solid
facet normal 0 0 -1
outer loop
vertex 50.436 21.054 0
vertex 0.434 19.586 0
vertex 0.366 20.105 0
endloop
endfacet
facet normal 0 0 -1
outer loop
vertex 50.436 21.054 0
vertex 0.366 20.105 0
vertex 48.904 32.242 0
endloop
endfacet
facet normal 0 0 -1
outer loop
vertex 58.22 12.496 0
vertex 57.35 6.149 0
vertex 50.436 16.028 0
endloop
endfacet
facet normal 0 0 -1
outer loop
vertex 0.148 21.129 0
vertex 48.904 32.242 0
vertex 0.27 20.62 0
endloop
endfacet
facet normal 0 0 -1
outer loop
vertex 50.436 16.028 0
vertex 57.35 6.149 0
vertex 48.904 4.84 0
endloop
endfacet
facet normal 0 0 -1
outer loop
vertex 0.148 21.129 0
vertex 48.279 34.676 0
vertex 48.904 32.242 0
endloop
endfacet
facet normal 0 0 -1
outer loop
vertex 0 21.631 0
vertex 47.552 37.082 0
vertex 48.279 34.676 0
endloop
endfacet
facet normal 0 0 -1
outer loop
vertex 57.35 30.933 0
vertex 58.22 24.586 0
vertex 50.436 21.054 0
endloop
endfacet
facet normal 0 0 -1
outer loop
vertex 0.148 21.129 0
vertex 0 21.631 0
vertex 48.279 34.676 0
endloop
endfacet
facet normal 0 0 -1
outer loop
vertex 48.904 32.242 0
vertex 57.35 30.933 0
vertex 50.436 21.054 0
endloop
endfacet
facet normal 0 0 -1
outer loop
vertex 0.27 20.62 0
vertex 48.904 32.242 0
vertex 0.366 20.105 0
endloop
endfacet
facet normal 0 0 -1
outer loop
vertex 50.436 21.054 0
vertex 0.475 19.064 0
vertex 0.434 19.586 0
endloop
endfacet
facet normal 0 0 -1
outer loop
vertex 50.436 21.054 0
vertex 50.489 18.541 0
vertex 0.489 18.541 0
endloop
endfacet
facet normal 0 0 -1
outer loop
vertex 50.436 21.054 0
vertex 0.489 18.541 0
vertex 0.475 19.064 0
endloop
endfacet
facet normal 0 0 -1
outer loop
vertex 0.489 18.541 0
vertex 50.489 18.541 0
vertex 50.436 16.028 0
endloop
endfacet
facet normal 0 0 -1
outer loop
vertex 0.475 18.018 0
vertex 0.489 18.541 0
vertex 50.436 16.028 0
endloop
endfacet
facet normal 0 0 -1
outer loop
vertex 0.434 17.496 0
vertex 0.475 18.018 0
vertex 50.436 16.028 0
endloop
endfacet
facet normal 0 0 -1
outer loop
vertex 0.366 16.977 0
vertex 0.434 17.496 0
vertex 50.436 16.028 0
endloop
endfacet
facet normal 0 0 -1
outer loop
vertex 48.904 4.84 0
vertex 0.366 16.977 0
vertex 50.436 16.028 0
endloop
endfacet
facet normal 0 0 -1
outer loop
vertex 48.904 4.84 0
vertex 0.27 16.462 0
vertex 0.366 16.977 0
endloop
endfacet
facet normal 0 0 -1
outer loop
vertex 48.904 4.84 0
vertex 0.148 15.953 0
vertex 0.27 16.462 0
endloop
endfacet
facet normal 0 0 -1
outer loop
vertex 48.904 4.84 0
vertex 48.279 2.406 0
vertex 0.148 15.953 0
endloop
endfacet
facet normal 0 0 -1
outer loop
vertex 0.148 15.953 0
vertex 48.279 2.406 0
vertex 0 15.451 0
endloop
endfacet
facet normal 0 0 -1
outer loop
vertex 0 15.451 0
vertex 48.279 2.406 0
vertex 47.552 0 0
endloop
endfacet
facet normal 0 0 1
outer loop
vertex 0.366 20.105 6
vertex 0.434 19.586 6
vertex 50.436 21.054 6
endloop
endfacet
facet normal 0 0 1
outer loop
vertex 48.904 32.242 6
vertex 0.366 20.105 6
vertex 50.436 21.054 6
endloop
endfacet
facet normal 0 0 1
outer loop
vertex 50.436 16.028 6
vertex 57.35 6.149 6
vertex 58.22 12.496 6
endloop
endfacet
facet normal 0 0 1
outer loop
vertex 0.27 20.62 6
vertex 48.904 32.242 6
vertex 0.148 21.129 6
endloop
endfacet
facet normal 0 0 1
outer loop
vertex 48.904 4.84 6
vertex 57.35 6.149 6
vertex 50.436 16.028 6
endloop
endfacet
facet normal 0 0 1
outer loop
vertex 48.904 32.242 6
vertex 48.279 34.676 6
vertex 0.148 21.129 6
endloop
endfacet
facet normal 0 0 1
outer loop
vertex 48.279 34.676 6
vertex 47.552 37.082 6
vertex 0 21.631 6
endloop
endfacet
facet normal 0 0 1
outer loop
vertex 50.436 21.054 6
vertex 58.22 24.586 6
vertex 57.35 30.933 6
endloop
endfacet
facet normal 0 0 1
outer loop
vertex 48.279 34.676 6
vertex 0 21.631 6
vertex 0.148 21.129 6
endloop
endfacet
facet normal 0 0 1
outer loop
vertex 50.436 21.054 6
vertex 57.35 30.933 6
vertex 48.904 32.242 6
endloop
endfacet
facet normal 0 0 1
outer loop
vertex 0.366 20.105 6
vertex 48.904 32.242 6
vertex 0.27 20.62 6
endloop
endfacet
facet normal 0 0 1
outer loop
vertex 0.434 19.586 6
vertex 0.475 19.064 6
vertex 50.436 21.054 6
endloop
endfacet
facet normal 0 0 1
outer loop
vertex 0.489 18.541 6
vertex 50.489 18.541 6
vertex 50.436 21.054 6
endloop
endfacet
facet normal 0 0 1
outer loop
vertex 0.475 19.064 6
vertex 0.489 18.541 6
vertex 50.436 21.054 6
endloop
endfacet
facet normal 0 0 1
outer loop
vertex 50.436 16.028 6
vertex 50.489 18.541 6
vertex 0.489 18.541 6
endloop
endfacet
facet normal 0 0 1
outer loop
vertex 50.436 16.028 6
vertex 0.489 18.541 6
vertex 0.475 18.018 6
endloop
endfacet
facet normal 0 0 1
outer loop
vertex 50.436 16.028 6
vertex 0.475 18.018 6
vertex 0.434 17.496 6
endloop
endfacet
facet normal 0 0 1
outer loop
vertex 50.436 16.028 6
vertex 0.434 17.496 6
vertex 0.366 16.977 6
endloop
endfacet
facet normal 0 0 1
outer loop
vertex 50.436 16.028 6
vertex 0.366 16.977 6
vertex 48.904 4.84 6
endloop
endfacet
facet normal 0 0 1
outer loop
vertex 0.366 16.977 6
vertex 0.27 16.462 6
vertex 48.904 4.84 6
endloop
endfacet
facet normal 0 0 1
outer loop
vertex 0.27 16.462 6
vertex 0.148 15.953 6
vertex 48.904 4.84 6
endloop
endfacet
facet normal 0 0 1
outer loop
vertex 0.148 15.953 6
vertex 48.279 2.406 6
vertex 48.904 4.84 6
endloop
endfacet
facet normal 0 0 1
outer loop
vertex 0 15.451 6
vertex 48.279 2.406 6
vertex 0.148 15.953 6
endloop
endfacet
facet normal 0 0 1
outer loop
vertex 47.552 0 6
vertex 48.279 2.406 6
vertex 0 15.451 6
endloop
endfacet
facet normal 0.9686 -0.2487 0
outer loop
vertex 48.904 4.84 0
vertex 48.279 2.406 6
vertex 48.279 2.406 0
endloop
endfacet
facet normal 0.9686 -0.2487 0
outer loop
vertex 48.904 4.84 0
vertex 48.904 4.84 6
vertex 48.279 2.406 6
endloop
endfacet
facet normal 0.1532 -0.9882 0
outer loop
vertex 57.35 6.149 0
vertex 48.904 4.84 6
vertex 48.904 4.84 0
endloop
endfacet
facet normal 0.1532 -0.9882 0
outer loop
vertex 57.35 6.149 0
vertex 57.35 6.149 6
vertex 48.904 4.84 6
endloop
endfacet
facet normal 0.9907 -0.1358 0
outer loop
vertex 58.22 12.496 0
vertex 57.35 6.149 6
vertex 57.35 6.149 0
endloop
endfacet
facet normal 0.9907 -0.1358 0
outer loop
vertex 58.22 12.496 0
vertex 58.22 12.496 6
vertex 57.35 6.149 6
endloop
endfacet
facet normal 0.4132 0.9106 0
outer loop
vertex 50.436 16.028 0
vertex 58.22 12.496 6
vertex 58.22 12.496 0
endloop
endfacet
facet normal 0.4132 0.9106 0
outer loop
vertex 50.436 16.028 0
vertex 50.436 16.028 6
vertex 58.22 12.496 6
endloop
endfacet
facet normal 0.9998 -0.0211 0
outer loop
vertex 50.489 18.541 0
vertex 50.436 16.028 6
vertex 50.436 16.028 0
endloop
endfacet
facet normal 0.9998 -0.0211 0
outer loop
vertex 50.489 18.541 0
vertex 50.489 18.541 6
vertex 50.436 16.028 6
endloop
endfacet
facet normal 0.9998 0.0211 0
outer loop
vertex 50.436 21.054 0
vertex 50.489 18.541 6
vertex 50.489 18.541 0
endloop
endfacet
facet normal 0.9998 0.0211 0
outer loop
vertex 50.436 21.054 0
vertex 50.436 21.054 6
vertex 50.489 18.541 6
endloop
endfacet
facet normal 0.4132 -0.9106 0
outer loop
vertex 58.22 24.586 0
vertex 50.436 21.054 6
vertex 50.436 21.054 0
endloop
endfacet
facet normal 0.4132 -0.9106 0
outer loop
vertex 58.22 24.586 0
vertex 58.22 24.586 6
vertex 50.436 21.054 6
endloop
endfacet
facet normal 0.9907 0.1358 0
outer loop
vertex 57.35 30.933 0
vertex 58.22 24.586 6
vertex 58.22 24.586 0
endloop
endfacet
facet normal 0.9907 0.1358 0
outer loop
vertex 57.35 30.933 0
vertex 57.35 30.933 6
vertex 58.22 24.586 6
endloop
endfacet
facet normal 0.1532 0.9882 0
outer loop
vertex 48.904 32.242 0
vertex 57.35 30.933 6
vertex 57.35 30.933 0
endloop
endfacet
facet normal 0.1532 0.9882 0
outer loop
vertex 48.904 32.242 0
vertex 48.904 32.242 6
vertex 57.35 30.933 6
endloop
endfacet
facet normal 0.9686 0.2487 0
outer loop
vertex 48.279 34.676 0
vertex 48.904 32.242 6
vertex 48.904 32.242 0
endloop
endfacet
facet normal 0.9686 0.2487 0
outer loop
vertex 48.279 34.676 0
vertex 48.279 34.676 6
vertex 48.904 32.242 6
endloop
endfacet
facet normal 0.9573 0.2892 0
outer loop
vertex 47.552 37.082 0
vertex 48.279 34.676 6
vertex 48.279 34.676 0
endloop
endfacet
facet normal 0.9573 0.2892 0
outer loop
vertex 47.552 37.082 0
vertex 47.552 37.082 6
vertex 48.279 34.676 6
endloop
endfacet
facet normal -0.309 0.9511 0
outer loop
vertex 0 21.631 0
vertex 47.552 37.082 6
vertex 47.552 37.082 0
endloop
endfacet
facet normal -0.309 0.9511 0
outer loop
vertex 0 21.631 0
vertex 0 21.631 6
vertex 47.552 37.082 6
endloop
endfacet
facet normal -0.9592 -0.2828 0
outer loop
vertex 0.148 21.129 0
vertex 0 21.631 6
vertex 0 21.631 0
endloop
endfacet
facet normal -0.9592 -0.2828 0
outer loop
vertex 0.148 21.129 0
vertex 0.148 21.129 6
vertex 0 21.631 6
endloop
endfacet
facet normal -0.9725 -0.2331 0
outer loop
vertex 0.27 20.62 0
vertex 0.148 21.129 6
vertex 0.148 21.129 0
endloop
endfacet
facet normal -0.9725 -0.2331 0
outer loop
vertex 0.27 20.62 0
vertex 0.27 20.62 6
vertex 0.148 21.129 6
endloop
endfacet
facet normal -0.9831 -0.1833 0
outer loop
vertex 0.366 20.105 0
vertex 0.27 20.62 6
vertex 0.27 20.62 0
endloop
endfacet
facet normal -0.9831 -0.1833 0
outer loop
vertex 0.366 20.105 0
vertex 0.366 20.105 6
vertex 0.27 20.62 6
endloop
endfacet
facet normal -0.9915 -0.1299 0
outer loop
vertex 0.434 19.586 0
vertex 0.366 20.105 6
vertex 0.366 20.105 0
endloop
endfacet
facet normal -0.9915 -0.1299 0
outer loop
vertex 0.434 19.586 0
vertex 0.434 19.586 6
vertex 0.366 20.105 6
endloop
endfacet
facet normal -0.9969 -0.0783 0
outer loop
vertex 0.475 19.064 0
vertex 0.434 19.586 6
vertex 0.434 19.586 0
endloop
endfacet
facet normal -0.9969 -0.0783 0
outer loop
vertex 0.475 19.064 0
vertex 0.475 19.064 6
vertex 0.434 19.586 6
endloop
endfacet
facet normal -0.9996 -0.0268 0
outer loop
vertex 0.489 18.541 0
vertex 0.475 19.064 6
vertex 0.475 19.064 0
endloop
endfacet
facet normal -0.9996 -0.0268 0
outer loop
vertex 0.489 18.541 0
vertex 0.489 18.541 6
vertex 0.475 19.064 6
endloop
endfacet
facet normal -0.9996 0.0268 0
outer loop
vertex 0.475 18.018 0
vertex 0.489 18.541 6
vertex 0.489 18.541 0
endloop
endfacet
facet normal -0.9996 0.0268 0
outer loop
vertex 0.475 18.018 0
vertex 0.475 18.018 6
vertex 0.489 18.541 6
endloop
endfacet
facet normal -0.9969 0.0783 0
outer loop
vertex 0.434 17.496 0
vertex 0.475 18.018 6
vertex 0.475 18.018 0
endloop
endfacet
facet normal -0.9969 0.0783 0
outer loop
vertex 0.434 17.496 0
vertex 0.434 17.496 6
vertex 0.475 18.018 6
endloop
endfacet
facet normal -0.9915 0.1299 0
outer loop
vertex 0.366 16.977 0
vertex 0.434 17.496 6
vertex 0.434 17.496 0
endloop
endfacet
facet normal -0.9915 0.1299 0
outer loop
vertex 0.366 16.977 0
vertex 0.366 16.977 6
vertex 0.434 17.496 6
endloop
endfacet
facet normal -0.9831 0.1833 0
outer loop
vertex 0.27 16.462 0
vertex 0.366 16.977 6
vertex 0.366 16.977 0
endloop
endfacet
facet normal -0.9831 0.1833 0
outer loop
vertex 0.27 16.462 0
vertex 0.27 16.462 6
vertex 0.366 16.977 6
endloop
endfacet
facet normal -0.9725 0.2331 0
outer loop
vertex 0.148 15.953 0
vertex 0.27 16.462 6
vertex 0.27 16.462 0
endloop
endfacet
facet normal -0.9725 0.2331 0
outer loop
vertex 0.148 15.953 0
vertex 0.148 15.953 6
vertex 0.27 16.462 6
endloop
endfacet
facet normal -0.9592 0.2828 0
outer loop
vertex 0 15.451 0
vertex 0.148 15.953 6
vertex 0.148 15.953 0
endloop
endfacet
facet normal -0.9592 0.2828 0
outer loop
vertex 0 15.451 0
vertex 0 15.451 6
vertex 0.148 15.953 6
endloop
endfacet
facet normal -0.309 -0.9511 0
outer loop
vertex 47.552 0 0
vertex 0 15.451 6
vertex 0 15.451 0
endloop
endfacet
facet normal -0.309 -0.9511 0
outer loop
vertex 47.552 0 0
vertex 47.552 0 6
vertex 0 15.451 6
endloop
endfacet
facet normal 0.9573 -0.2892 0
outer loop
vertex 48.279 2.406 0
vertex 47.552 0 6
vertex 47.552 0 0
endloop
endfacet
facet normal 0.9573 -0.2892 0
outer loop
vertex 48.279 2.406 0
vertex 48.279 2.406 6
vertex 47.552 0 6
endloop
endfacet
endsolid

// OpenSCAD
$fn = 32;

// ----------------------------------------------------------------------
// Gear sector: 2 teeth on 36 degrees
// ----------------------------------------------------------------------

// --- parameters (mm) ---
sector_angle = 36;        // sector angle, degrees
root_r = 60;              // root circle radius
tooth_h = 8;              // tooth height over the root circle
teeth = 2;                // number of teeth on the sector
hub_r = 10;               // hub bore radius
plate_t = 6;              // sector thickness, Z
arc_step = 3;             // sampling step of the root/hub arcs, degrees
fit_tol = 0.02;           // declared fit tolerance (prompt contract)
free_tol = 0.2;           // declared free tolerance (prompt contract)

tip_r = root_r + tooth_h;  // tip circle radius

profile = [[47.552, 0], [48.279, 2.406], [48.904, 4.84], [57.35, 6.149], [58.22, 12.496], [50.436, 16.028], [50.489, 18.541], [50.436, 21.054], [58.22, 24.586], [57.35, 30.933], [48.904, 32.242], [48.279, 34.676], [47.552, 37.082], [0, 21.631], [0.148, 21.129], [0.27, 20.62], [0.366, 20.105], [0.434, 19.586], [0.475, 19.064], [0.489, 18.541], [0.475, 18.018], [0.434, 17.496], [0.366, 16.977], [0.27, 16.462], [0.148, 15.953], [0, 15.451]];  // primary outline, 26 points, counter clockwise

// --- the one profile operation ---
linear_extrude(height = plate_t) polygon(points = profile);
